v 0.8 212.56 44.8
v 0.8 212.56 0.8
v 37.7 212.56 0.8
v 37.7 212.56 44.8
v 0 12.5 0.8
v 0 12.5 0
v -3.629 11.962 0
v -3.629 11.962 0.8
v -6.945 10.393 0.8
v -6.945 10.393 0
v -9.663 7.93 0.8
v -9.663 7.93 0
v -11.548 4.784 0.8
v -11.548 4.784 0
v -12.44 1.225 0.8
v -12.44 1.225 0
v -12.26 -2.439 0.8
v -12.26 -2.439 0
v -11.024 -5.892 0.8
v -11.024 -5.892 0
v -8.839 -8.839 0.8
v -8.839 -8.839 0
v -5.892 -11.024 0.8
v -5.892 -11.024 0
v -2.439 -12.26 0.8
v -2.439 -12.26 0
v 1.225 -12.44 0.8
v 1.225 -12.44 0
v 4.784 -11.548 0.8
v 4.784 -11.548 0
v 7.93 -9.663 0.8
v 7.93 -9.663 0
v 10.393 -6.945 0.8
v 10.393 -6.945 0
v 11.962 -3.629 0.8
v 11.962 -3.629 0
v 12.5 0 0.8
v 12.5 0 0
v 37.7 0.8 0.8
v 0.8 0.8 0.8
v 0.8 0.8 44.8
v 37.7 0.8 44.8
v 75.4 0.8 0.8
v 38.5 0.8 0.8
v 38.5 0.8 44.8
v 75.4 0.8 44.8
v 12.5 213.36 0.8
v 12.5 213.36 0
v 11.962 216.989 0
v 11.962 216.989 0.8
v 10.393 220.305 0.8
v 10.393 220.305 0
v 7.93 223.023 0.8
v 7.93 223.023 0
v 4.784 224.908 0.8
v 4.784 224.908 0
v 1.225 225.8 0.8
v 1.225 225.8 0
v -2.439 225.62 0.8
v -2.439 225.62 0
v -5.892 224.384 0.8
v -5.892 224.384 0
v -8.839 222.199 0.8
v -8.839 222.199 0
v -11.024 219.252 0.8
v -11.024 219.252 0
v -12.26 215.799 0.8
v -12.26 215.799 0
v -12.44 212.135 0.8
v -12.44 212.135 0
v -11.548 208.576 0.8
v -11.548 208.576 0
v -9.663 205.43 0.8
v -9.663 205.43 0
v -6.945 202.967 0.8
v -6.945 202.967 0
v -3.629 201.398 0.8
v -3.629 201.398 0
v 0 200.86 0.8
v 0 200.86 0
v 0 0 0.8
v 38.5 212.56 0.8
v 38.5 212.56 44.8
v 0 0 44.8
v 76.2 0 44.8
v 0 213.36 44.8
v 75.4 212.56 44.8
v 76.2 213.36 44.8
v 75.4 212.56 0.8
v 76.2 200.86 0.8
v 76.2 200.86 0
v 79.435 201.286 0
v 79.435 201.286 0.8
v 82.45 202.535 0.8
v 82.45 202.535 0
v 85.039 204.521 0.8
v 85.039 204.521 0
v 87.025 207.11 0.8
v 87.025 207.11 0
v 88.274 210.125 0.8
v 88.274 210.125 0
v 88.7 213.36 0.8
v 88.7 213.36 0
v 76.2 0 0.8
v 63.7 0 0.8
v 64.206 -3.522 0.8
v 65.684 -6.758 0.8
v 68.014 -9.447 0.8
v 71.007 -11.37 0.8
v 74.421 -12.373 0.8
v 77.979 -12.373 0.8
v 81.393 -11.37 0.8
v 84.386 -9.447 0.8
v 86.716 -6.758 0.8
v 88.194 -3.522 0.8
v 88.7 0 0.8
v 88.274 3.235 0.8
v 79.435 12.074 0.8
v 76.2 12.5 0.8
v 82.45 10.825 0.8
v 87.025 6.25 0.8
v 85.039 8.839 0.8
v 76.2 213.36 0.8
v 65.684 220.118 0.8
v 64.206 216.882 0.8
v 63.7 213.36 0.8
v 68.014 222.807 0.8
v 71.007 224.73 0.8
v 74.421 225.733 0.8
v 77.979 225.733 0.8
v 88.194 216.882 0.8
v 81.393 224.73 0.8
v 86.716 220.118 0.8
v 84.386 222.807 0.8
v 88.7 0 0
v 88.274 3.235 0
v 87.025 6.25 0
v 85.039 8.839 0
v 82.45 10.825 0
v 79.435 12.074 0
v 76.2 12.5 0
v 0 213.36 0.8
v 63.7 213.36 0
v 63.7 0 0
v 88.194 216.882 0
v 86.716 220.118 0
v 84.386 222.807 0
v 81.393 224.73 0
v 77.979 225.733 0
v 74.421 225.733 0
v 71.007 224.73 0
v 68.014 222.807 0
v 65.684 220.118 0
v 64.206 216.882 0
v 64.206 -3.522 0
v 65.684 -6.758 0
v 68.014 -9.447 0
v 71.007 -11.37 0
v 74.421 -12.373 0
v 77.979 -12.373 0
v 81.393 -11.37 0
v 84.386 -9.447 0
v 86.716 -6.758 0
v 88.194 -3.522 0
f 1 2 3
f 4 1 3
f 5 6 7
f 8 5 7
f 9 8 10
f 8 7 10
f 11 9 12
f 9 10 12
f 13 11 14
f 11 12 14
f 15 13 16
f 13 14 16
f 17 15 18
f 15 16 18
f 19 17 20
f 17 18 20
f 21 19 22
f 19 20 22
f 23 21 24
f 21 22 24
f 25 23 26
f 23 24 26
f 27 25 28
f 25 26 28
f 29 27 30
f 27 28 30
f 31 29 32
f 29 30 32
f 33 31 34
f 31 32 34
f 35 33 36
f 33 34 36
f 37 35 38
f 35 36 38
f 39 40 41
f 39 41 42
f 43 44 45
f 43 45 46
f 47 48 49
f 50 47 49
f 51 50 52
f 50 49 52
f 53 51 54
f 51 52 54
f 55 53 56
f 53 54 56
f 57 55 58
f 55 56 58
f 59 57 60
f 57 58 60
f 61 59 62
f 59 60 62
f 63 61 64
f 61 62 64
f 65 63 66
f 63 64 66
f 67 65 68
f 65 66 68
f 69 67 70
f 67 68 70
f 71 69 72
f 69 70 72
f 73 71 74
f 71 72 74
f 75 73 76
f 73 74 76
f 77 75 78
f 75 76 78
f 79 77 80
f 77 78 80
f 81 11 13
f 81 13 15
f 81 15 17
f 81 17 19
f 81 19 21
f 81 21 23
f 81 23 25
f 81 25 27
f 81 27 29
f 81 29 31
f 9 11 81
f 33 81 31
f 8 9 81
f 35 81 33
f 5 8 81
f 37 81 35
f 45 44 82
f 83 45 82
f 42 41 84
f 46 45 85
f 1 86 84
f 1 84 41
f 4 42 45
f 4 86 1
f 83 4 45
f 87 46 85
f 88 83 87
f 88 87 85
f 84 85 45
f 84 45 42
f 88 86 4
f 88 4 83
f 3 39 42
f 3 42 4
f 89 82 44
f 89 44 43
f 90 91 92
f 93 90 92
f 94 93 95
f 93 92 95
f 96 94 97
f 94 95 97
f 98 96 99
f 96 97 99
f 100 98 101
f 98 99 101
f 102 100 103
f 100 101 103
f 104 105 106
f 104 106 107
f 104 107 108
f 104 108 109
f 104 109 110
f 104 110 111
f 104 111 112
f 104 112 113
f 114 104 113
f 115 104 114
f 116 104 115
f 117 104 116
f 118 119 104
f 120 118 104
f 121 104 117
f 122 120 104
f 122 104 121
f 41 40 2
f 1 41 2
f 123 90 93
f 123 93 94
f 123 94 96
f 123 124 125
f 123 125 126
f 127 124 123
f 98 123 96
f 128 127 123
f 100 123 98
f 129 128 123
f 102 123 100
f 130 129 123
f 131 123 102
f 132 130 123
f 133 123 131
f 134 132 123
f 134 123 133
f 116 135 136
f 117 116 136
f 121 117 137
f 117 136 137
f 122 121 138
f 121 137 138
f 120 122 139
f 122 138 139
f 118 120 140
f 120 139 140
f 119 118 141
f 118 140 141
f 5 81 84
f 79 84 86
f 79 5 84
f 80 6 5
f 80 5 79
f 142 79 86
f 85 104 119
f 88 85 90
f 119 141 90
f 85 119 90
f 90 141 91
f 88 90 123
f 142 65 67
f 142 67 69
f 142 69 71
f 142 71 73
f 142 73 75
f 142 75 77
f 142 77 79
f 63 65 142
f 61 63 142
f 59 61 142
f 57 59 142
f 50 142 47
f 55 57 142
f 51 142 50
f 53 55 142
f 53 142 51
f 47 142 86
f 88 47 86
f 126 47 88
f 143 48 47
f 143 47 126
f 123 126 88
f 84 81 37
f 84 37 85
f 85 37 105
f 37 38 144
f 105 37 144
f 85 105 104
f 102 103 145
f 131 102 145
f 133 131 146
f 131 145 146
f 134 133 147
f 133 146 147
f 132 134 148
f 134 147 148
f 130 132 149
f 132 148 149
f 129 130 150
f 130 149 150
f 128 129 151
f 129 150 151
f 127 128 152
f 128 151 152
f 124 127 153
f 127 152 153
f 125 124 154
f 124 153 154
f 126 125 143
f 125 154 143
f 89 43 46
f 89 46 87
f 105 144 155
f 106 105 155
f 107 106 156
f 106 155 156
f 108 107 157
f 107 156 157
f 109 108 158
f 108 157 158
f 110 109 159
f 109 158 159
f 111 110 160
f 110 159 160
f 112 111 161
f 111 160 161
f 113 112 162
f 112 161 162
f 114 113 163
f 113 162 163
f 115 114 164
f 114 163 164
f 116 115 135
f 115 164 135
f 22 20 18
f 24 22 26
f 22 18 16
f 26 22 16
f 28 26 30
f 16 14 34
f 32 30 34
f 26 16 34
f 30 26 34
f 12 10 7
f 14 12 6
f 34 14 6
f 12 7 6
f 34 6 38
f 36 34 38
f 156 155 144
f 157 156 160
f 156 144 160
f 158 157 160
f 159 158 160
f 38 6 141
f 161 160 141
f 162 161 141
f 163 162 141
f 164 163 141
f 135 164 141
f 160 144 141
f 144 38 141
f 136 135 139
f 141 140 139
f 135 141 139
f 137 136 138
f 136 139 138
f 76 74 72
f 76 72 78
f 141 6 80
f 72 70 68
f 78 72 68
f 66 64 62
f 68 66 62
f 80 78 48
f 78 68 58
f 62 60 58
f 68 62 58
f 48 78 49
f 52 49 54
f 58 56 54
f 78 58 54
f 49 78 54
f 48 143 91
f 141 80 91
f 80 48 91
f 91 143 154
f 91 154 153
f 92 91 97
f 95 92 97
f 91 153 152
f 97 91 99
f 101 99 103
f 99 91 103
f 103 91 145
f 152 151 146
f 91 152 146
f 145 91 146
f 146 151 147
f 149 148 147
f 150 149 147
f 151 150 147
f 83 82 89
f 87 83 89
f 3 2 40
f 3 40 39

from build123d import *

# Parameters (mm, degrees)
F1_DEPTH = 0.8
F2_W     = 76.2
F2_H     = 213.36
F2_W_2   = 36.9
F2_H_2   = 211.76
F3_DEPTH = 44
F4_DEPTH = 0.8


with BuildPart() as f1:
    # F0 (on Top) → F1 (new body)
    with BuildSketch(Plane.XY):
        with BuildLine():
            ThreePointArc((0, 12.5), (8.838835, 8.838835), (12.5, 0))
            Line((12.5, 0), (63.7, 0))
            ThreePointArc((63.7, 0), (67.361165, 8.838835), (76.2, 12.5))
            Line((76.2, 12.5), (76.2, 200.86))
            ThreePointArc((76.2, 200.86), (67.361165, 204.521165), (63.7, 213.36))
            Line((63.7, 213.36), (12.5, 213.36))
            ThreePointArc((12.5, 213.36), (8.838835, 204.521165), (0, 200.86))
            Line((0, 200.86), (0, 12.5))
        make_face()
        with BuildLine():
            Line((0, 12.5), (0, 0))
            Line((0, 0), (12.5, 0))
            ThreePointArc((12.5, 0), (8.838835, 8.838835), (0, 12.5))
        make_face()
        with BuildLine():
            ThreePointArc((63.7, 213.36), (67.361165, 204.521165), (76.2, 200.86))
            Line((76.2, 200.86), (76.2, 213.36))
            Line((76.2, 213.36), (63.7, 213.36))
        make_face()
        with BuildLine():
            Line((0, 213.36), (0, 200.86))
            ThreePointArc((0, 200.86), (8.838835, 204.521165), (12.5, 213.36))
            Line((12.5, 213.36), (0, 213.36))
        make_face()
    extrude(amount=F1_DEPTH)

    # F2 (on face) → F3 (join)
    with BuildSketch(Plane.XY.offset(0.8)):
        with Locations((38.1, 106.68)):
            Rectangle(F2_W, F2_H)
        with Locations((19.25, 106.68)):
            Rectangle(F2_W_2, F2_H_2, mode=Mode.SUBTRACT)
        with Locations((56.95, 106.68)):
            Rectangle(F2_W_2, F2_H_2, mode=Mode.SUBTRACT)
    extrude(amount=F3_DEPTH)

    # F0 (on Top) → F4 (join, through all)
    with BuildSketch(Plane.XY):
        with BuildLine():
            Line((76.2, 0), (63.7, 0))
            ThreePointArc((63.7, 0), (76.2, -12.5), (88.7, 0))
            ThreePointArc((88.7, 0), (85.038835, 8.838835), (76.2, 12.5))
            Line((76.2, 12.5), (76.2, 0))
        make_face()
        with BuildLine():
            Line((12.5, 0), (0, 0))
            Line((0, 0), (0, 12.5))
            ThreePointArc((0, 12.5), (-8.838835, -8.838835), (12.5, 0))
        make_face()
        with BuildLine():
            ThreePointArc((12.5, 213.36), (-8.838835, 222.198835), (0, 200.86))
            Line((0, 200.86), (0, 213.36))
            Line((0, 213.36), (12.5, 213.36))
        make_face()
        with BuildLine():
            Line((76.2, 213.36), (76.2, 200.86))
            ThreePointArc((76.2, 200.86), (85.038835, 204.521165), (88.7, 213.36))
            ThreePointArc((88.7, 213.36), (76.2, 225.86), (63.7, 213.36))
            Line((63.7, 213.36), (76.2, 213.36))
        make_face()
        with BuildLine():
            ThreePointArc((76.2, 12.5), (67.361165, 8.838835), (63.7, 0))
            Line((63.7, 0), (76.2, 0))
            Line((76.2, 0), (76.2, 12.5))
        make_face()
        with BuildLine():
            Line((0, 12.5), (0, 0))
            Line((0, 0), (12.5, 0))
            ThreePointArc((12.5, 0), (8.838835, 8.838835), (0, 12.5))
        make_face()
        with BuildLine():
            Line((0, 213.36), (0, 200.86))
            ThreePointArc((0, 200.86), (8.838835, 204.521165), (12.5, 213.36))
            Line((12.5, 213.36), (0, 213.36))
        make_face()
        with BuildLine():
            ThreePointArc((63.7, 213.36), (67.361165, 204.521165), (76.2, 200.86))
            Line((76.2, 200.86), (76.2, 213.36))
            Line((76.2, 213.36), (63.7, 213.36))
        make_face()
    extrude(amount=F4_DEPTH)


solid = f1.part
